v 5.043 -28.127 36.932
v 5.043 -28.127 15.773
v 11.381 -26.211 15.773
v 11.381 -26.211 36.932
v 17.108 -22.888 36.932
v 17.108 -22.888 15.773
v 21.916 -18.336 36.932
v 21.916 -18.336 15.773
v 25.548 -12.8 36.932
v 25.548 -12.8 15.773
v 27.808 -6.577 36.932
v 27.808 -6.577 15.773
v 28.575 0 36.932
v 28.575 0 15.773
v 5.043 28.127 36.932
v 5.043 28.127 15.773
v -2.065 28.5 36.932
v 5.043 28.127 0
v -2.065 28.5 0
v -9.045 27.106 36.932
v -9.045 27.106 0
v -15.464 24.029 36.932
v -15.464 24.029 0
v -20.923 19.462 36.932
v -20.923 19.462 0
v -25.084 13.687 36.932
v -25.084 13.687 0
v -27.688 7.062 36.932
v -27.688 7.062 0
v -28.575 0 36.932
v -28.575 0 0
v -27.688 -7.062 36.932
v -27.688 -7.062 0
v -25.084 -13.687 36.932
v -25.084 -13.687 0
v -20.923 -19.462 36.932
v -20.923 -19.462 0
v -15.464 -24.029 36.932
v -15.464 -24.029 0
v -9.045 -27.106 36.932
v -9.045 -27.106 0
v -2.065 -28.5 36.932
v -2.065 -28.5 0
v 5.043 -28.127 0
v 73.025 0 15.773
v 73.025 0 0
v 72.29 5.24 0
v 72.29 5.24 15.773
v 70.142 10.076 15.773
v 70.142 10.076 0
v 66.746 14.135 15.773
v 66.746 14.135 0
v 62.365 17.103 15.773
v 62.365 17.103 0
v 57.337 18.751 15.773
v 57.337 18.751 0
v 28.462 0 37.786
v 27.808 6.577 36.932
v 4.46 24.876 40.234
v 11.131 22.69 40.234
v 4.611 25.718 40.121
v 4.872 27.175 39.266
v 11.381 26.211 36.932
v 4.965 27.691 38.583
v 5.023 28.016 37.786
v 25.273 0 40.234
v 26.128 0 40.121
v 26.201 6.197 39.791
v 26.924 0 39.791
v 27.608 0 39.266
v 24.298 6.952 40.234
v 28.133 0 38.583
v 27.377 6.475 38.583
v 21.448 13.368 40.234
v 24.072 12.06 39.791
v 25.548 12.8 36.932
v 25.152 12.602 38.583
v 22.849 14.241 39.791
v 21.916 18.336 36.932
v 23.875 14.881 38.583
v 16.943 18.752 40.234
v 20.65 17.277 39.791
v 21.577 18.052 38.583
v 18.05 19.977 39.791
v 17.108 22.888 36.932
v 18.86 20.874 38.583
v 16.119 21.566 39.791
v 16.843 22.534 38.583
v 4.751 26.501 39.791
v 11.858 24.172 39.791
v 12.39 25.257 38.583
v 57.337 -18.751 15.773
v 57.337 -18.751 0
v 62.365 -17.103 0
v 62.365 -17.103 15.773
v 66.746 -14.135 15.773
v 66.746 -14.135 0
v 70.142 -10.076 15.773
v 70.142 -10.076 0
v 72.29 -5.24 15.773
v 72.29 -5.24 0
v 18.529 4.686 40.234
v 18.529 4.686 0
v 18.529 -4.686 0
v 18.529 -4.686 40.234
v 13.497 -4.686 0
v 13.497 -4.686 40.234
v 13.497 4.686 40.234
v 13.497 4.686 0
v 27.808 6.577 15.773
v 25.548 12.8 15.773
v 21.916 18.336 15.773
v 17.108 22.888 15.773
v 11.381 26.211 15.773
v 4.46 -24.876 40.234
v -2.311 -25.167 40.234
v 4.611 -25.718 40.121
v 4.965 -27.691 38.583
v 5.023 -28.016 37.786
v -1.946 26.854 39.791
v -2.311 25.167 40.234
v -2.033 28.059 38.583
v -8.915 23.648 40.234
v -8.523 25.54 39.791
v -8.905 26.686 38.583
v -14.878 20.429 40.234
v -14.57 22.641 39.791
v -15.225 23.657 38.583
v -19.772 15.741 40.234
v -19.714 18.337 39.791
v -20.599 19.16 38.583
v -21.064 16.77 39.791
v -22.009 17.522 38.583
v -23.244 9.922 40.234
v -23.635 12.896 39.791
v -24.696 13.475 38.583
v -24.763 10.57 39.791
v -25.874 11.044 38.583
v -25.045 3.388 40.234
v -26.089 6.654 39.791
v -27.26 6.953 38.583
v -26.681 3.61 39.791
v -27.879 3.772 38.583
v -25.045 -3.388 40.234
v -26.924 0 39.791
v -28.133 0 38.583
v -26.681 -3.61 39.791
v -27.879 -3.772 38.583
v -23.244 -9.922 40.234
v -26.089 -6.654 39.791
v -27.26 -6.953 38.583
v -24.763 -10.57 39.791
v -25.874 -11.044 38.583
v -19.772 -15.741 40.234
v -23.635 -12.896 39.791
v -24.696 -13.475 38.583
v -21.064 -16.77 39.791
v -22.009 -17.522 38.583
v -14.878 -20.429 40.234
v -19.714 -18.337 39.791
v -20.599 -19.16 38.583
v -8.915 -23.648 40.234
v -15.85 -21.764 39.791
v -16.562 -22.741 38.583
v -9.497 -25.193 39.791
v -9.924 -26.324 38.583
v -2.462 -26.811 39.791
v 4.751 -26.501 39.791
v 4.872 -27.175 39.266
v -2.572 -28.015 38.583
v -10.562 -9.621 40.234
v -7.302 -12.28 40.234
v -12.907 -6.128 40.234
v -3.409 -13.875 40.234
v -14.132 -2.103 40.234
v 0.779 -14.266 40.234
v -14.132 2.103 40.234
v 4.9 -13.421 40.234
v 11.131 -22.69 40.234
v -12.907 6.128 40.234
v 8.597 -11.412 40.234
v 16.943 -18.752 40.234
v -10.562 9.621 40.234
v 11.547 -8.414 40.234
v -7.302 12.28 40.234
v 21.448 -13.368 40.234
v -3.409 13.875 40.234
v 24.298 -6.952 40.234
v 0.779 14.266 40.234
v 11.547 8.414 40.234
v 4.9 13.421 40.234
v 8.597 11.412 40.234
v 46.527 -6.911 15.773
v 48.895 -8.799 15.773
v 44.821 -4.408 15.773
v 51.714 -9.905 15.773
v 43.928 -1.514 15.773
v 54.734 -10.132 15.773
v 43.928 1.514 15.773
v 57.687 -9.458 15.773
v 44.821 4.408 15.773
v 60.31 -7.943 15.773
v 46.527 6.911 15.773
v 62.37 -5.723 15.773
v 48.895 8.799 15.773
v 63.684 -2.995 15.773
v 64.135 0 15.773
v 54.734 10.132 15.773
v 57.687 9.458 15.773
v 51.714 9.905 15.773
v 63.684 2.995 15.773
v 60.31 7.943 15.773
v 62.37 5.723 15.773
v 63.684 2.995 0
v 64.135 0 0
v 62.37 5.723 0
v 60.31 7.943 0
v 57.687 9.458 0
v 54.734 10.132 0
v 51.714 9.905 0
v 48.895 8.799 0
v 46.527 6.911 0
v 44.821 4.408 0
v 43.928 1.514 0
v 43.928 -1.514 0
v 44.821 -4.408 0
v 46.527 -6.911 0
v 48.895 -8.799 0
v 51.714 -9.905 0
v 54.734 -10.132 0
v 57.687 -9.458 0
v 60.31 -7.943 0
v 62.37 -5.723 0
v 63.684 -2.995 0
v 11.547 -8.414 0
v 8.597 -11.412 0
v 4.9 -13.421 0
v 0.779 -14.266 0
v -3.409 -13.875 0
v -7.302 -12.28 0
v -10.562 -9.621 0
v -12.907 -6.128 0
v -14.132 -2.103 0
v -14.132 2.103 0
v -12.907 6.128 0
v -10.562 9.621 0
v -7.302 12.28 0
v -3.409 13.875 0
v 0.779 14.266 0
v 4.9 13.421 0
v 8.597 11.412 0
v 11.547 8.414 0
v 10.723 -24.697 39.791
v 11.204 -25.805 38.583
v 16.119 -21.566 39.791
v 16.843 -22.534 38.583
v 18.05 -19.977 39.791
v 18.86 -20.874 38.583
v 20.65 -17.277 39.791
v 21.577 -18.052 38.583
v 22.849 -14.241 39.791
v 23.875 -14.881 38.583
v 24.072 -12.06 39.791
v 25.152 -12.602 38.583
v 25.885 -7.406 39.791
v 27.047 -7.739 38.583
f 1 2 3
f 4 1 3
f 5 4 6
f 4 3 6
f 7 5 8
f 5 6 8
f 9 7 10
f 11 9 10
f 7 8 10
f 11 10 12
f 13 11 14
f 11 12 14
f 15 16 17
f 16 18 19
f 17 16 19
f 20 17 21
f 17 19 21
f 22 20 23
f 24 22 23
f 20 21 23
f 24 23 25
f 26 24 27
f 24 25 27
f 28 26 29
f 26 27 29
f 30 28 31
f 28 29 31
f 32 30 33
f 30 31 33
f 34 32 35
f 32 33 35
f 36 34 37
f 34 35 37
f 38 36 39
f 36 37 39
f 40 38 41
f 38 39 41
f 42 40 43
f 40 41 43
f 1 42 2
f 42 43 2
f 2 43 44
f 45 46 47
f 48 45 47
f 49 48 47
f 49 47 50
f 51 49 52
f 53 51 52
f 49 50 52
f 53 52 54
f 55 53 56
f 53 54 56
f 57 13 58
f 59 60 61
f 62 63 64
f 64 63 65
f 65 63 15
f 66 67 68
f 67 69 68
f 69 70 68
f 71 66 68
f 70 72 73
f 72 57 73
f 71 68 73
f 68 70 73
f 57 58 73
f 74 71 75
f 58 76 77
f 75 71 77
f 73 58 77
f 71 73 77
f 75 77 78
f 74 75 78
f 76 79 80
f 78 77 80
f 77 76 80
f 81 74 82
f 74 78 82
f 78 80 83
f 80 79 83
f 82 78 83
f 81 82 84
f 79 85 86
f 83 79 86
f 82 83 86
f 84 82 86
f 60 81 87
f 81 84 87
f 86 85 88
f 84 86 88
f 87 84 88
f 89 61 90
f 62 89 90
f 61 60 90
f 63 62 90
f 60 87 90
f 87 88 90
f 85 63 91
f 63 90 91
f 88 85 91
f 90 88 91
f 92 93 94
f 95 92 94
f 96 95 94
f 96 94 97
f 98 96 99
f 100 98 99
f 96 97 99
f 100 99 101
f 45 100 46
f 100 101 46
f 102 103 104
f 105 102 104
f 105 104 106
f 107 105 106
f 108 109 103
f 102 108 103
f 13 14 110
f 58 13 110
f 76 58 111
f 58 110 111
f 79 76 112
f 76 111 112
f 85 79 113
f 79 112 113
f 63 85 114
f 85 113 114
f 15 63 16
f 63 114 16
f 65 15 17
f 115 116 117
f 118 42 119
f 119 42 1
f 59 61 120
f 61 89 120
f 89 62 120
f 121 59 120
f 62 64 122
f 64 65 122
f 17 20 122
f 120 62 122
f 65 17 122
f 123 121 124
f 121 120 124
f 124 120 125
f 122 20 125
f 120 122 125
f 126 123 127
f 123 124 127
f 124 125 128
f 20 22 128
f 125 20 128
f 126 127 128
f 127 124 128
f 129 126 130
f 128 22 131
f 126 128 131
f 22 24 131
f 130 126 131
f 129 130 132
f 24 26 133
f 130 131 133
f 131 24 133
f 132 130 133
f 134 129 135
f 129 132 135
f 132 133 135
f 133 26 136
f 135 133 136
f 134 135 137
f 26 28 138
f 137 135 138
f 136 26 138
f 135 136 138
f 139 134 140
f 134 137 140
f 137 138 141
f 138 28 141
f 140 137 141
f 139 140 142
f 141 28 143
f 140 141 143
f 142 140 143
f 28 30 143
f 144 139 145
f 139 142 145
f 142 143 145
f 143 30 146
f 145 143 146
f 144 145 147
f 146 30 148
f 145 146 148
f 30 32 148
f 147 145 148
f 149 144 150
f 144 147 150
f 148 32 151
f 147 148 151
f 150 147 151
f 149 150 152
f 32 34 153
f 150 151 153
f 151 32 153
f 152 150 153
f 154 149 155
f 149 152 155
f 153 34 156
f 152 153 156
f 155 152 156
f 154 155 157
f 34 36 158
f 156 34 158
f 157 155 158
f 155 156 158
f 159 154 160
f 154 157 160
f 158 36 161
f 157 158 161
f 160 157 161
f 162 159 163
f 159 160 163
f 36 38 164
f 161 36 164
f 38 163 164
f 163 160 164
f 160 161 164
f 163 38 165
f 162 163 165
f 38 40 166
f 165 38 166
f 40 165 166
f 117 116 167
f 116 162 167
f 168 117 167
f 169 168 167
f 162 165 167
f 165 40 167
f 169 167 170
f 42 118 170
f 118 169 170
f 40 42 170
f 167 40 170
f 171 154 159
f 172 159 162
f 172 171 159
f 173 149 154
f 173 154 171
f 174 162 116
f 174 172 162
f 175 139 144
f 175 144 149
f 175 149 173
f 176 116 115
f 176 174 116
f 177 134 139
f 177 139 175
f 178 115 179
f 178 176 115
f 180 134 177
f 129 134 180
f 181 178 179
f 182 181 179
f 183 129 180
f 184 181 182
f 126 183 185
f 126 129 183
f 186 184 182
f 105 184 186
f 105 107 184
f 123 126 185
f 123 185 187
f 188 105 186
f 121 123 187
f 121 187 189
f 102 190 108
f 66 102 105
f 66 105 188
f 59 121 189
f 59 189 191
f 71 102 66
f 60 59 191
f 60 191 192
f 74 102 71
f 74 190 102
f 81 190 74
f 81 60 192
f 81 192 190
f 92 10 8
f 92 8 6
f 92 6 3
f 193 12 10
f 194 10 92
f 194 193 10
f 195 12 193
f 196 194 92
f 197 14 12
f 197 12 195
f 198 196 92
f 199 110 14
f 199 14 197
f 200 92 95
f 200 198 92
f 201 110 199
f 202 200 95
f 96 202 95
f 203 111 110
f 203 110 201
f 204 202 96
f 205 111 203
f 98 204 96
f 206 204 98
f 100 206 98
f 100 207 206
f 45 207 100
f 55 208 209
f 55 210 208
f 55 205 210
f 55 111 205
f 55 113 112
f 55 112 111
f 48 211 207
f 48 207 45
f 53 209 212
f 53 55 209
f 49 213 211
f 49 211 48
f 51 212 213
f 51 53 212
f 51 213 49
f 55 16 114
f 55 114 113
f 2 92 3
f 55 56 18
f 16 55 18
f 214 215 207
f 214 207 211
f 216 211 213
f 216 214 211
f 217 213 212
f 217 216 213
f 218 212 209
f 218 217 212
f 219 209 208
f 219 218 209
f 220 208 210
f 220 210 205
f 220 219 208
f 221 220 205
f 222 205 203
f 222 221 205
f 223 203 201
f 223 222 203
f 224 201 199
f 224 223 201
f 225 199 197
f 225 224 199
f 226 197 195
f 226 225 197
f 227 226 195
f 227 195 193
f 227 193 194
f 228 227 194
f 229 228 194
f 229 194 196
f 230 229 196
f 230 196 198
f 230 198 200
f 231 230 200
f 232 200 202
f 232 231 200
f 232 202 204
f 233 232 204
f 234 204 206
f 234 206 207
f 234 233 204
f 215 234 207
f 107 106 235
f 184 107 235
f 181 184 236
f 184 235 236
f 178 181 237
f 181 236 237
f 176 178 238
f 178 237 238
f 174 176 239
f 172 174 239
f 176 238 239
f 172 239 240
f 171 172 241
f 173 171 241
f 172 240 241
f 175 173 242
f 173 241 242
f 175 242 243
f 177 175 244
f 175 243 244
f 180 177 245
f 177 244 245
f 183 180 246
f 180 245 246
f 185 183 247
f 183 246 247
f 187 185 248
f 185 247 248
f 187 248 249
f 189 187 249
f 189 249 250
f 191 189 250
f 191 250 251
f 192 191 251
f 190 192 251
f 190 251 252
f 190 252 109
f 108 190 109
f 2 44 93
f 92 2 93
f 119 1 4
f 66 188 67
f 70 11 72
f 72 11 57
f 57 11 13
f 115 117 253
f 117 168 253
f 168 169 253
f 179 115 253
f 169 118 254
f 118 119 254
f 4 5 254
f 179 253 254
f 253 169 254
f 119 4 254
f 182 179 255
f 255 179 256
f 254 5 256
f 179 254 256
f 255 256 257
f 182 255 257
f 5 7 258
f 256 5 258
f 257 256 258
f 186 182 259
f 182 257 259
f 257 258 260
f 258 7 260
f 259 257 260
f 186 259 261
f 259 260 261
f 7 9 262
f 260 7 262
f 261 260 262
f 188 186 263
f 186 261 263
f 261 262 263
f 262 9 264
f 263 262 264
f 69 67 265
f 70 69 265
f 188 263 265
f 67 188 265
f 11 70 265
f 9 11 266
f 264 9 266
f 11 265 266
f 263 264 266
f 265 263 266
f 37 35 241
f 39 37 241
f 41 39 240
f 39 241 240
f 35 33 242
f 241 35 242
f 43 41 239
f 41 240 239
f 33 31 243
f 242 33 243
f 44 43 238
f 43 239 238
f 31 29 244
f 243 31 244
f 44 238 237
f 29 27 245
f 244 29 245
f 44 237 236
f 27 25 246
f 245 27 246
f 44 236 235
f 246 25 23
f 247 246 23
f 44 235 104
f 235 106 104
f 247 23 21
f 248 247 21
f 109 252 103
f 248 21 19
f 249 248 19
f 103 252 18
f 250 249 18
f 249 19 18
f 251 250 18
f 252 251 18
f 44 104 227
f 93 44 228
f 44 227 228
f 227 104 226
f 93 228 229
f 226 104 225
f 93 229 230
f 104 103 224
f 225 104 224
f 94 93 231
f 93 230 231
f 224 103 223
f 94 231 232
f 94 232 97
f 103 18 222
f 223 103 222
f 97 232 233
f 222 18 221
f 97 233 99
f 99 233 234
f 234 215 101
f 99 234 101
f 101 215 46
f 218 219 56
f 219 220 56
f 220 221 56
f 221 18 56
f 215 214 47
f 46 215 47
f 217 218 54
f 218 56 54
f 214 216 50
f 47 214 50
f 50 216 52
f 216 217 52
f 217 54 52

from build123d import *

# Parameters (mm, degrees)
F1_DEPTH = 40.2336
F0_R     = 10.16
F2_DEPTH = 15.7734
F3_R     = 3.302


with BuildPart() as f1:
    # F0 (on Top) → F1 (new body)
    with BuildSketch(Plane.XY):
        with BuildLine():
            ThreePointArc((5.042647, -28.126541), (21.916025, -18.336262), (28.575, 0))
            ThreePointArc((28.575, 0), (21.916025, 18.336262), (5.042647, 28.126541))
            ThreePointArc((5.042647, 28.126541), (-28.575, 0), (5.042647, -28.126541))
        make_face()
        with BuildLine():
            ThreePointArc((13.497268, -4.685767), (-14.2875, 0), (13.497268, 4.685767))
            Line((13.497268, 4.685767), (18.5293, 4.685767))
            Line((18.5293, 4.685767), (18.5293, -4.685767))
            Line((18.5293, -4.685767), (13.497268, -4.685767))
        make_face(mode=Mode.SUBTRACT)
    extrude(amount=F1_DEPTH)

    # F0 (on Top) → F2 (join)
    with BuildSketch(Plane.XY):
        with BuildLine():
            ThreePointArc((5.042647, -28.126541), (21.916025, -18.336262), (28.575, 0))
            ThreePointArc((28.575, 0), (21.916025, 18.336262), (5.042647, 28.126541))
            ThreePointArc((5.042647, 28.126541), (-28.575, 0), (5.042647, -28.126541))
        make_face()
        with BuildLine():
            ThreePointArc((13.497268, -4.685767), (-14.2875, 0), (13.497268, 4.685767))
            Line((13.497268, 4.685767), (18.5293, 4.685767))
            Line((18.5293, 4.685767), (18.5293, -4.685767))
            Line((18.5293, -4.685767), (13.497268, -4.685767))
        make_face(mode=Mode.SUBTRACT)
        with BuildLine():
            ThreePointArc((5.042647, 28.126541), (21.916025, 18.336262), (28.575, 0))
            ThreePointArc((28.575, 0), (21.916025, -18.336262), (5.042647, -28.126541))
            Line((5.042647, -28.126541), (57.336765, -18.751028))
            ThreePointArc((57.336765, -18.751028), (34.925, 0), (57.336765, 18.751028))
            Line((57.336765, 18.751028), (5.042647, 28.126541))
        make_face()
        with BuildLine():
            ThreePointArc((73.025, 0), (68.585683, 12.224174), (57.336765, 18.751028))
            ThreePointArc((57.336765, 18.751028), (34.925, 0), (57.336765, -18.751028))
            ThreePointArc((57.336765, -18.751028), (68.585683, -12.224174), (73.025, 0))
        make_face()
        with Locations((53.975, 0)):
            Circle(F0_R, mode=Mode.SUBTRACT)
    extrude(amount=F2_DEPTH)

    # F3
    f3_edges = [f1.edges().sort_by_distance(p)[0] for p in [
        (-5.042647, 28.126541, 40.2336),
    ]]
    fillet(f3_edges, radius=F3_R)


solid = f1.part
